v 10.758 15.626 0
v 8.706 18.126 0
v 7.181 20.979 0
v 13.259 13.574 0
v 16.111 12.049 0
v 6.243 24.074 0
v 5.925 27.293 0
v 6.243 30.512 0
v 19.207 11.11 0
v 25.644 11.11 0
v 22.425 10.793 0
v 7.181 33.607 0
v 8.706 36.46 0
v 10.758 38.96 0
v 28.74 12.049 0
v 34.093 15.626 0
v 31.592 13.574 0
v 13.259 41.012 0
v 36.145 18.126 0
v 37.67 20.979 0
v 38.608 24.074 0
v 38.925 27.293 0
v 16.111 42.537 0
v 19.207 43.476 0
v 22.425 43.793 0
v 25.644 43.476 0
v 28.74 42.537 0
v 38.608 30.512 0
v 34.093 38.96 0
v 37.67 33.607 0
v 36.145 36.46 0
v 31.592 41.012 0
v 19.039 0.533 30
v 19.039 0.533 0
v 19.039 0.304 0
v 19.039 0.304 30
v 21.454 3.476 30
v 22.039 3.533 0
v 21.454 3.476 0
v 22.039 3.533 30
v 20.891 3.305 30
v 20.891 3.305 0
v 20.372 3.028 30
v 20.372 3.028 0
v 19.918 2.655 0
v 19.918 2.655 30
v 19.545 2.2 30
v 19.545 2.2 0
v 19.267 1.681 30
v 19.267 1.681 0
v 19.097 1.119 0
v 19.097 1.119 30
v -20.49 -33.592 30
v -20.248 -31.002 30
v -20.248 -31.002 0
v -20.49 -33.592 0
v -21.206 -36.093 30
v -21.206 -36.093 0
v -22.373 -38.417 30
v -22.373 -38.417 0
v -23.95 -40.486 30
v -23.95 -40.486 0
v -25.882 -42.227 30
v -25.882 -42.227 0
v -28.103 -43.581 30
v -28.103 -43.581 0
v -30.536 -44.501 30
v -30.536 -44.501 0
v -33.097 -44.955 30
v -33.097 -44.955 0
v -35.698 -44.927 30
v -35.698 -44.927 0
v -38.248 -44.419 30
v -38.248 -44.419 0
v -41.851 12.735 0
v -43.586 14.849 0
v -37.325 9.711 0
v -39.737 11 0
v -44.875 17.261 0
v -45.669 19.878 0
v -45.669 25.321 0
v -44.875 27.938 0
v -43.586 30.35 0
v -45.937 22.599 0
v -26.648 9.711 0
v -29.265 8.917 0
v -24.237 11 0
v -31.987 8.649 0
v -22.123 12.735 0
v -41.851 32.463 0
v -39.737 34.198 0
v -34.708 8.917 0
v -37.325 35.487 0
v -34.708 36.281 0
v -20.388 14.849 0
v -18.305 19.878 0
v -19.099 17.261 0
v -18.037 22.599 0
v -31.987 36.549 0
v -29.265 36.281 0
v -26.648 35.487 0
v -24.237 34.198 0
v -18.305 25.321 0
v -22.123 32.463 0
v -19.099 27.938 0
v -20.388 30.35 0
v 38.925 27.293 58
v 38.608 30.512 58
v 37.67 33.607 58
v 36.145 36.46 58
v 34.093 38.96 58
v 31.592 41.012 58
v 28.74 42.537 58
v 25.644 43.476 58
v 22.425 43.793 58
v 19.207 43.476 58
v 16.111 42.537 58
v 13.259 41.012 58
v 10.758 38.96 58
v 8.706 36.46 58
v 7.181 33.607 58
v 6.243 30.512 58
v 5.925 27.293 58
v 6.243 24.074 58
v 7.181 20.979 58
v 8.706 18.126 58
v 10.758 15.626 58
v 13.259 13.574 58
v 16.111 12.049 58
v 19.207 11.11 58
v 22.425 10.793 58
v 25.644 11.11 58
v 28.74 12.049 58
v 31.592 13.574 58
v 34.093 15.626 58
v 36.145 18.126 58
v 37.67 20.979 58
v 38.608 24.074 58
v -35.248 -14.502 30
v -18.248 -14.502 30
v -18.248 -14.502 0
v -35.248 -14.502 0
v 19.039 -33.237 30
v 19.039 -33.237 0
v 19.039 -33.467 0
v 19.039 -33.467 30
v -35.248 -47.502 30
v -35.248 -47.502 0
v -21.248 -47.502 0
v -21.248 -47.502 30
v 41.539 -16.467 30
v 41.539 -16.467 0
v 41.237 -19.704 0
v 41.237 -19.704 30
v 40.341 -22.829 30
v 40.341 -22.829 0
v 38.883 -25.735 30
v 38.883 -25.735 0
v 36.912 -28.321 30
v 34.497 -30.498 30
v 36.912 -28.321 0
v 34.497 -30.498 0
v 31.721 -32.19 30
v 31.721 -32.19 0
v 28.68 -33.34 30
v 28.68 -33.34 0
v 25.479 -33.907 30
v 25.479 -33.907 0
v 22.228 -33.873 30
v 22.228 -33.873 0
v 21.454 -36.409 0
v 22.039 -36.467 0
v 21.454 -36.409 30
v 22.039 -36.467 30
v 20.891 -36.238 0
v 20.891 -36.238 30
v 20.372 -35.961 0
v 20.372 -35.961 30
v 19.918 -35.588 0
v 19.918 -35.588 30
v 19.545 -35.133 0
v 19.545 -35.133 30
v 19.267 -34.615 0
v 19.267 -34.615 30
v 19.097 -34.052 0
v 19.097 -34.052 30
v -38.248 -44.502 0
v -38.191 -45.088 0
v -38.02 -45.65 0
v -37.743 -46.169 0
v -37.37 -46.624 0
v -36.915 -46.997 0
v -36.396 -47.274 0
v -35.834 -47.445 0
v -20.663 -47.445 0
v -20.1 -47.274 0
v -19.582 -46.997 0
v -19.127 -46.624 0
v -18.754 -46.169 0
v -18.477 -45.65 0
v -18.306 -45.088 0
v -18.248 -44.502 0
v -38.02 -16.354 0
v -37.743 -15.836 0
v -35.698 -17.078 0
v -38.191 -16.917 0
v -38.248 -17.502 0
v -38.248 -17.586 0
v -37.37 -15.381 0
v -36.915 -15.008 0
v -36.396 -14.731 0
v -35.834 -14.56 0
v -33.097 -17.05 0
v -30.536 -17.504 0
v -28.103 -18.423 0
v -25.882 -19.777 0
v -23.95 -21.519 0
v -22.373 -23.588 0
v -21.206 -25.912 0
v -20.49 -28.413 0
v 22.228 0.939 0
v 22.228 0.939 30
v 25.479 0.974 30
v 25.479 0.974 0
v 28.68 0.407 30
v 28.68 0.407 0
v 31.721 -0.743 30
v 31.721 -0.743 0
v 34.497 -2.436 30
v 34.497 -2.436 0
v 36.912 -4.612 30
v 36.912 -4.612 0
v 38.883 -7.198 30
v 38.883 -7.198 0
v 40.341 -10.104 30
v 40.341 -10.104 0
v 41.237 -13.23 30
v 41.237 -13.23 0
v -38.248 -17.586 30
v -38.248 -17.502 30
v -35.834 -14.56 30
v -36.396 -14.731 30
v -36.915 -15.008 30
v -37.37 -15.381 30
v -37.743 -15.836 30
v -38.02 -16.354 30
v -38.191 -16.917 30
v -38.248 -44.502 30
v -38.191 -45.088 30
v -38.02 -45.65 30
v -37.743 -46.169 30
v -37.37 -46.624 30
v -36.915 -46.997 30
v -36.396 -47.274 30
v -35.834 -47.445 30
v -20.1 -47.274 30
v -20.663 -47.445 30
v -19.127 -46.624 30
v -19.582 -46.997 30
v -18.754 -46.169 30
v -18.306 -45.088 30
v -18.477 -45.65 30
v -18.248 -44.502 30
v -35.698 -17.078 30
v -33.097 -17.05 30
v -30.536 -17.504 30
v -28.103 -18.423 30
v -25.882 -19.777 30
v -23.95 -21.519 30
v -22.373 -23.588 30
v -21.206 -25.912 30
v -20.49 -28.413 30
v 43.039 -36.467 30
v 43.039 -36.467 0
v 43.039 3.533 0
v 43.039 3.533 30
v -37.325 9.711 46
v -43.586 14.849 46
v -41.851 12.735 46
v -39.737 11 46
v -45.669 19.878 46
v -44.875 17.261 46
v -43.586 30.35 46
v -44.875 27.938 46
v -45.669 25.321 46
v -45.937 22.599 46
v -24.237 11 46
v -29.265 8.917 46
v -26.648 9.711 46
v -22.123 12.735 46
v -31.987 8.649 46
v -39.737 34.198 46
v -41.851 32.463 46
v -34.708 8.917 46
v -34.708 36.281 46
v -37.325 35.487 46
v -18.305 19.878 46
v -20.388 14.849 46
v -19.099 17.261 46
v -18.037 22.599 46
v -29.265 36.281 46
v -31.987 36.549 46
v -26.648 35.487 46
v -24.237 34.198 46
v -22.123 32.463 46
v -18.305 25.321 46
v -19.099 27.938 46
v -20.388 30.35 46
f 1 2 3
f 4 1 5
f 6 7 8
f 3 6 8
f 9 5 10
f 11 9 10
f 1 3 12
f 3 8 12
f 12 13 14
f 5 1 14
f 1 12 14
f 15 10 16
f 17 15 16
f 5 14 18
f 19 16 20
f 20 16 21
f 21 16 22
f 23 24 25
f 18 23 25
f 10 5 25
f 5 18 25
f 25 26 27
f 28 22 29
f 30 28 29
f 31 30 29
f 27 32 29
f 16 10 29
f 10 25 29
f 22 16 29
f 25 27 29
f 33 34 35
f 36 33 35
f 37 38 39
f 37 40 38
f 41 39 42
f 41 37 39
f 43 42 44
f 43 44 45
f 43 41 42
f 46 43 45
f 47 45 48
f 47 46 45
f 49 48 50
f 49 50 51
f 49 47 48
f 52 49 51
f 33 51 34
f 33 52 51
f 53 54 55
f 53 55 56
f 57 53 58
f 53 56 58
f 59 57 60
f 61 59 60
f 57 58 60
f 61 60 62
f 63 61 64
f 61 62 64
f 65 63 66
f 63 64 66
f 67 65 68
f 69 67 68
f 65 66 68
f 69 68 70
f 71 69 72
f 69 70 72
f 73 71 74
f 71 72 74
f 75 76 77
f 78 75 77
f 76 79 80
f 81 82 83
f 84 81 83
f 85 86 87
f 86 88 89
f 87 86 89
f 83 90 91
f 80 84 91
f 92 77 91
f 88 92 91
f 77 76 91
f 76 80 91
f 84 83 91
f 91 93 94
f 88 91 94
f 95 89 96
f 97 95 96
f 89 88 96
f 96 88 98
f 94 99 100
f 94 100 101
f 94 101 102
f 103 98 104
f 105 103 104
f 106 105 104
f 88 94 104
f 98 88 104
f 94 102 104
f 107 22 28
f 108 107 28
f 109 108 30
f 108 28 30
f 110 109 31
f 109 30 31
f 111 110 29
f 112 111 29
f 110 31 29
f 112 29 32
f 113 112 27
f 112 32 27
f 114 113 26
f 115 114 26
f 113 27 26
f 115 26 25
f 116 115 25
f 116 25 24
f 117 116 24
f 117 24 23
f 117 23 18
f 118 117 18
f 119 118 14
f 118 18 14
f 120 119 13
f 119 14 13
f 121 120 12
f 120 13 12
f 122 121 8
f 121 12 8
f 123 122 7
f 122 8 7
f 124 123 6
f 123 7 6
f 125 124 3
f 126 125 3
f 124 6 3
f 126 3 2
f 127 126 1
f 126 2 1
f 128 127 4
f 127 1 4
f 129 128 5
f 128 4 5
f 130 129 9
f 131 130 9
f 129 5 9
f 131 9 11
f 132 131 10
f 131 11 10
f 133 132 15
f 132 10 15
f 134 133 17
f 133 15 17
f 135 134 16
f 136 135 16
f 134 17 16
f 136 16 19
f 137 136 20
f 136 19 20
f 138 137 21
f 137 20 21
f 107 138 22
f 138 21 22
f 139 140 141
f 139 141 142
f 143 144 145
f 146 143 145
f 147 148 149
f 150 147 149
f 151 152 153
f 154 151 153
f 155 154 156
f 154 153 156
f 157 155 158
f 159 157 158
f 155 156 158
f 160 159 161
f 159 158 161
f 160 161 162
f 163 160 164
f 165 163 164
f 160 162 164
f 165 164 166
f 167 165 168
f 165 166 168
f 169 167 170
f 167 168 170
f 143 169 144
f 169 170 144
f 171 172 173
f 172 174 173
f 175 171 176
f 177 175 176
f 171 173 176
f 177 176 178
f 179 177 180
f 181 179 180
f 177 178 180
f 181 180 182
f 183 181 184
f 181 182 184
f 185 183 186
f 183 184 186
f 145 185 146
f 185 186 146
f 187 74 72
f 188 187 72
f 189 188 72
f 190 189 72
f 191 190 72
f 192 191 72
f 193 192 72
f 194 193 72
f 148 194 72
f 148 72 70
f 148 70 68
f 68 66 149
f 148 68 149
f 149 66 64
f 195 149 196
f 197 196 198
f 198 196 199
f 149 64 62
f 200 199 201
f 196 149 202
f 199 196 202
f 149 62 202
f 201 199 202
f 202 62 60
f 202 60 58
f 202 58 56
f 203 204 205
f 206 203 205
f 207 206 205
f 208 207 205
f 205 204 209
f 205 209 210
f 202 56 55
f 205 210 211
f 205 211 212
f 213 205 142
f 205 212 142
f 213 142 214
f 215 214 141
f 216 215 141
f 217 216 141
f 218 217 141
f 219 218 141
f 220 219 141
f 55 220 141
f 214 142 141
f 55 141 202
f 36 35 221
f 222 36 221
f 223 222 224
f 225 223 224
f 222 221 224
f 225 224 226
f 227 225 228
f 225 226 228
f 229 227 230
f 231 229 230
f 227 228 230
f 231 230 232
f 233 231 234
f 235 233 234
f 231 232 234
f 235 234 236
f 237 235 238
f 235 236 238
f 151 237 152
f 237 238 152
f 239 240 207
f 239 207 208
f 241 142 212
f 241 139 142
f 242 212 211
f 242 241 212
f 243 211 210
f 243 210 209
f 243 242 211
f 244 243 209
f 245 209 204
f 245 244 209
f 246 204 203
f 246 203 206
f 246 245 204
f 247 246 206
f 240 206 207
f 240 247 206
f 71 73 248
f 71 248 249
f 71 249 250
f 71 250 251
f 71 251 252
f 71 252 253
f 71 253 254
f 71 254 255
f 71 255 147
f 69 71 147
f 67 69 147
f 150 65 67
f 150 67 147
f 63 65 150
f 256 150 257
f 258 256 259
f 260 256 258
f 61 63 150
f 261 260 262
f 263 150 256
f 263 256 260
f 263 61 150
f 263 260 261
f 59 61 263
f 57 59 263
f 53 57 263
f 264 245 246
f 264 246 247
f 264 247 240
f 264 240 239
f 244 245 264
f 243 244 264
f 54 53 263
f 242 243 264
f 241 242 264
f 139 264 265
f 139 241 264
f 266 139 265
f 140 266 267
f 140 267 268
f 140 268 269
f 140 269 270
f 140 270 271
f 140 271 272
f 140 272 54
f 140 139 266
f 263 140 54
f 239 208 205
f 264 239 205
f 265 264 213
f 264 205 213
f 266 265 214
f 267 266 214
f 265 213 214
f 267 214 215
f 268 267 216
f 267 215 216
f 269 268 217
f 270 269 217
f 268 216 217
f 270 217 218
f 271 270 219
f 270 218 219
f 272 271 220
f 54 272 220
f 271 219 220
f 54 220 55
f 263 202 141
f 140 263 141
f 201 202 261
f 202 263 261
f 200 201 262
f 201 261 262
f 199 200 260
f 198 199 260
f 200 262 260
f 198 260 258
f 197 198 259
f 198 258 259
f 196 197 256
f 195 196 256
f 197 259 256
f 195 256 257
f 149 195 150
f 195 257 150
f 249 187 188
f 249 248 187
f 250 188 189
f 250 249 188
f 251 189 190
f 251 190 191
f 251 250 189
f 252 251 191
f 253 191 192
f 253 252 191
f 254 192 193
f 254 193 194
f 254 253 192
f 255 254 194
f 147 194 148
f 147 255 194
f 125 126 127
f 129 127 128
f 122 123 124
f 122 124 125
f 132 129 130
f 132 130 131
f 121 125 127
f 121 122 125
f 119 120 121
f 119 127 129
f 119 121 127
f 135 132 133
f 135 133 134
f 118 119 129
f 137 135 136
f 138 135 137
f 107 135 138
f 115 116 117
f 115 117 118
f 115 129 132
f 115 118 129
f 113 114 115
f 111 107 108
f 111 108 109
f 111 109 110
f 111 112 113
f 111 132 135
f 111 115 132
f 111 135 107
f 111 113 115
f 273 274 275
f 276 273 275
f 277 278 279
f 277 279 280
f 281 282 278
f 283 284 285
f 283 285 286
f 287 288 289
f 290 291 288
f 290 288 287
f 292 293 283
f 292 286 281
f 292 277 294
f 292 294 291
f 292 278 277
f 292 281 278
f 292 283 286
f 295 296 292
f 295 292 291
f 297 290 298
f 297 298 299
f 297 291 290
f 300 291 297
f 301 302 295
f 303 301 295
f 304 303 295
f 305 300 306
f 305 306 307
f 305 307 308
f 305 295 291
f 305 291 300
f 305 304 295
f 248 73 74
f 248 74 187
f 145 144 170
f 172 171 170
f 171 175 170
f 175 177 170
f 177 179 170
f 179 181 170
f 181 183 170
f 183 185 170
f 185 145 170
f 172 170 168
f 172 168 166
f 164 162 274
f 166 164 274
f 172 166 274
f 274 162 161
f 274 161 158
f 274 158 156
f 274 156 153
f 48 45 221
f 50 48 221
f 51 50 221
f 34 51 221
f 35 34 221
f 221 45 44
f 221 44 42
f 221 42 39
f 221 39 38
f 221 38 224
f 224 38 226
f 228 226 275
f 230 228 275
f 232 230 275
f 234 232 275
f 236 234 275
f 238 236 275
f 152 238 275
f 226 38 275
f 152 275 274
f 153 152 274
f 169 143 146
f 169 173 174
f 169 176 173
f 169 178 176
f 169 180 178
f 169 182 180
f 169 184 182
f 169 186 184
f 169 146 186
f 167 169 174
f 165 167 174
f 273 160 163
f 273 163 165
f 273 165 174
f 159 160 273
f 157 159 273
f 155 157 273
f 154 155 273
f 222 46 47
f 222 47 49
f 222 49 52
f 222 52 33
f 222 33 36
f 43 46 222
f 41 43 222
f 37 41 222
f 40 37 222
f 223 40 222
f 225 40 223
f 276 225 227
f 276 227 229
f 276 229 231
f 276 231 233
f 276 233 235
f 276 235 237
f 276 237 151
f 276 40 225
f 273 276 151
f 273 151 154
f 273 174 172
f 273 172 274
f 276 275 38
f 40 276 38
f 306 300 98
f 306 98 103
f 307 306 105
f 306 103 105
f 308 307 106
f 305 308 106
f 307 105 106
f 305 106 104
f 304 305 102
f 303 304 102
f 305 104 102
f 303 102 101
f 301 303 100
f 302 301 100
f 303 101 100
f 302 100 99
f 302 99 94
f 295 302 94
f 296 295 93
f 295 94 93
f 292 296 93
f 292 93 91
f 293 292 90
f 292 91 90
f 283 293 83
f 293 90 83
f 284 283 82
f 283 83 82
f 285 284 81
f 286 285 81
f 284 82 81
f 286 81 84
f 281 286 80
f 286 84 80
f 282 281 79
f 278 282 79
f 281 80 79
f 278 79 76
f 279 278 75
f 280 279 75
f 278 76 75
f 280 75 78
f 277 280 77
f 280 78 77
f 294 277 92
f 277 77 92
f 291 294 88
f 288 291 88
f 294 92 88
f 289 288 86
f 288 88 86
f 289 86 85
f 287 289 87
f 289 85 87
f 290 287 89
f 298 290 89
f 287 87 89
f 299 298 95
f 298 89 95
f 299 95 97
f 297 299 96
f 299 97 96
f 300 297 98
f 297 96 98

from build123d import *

# Parameters (mm, degrees)
F0_R     = 13.95
F1_DEPTH = 46
F0_R_2   = 16.5
F2_DEPTH = 58
F4_DEPTH = 30
F5_R     = 3
F6_R     = 3


with BuildPart() as f1:
    # F0 (on Top) → F1 (new body)
    with BuildSketch(Plane.XY):
        with Locations((-31.986754, 22.599338)):
            Circle(F0_R)
    extrude(amount=F1_DEPTH)


with BuildPart() as f2:
    # F0 (on Top) → F2 (new body)
    with BuildSketch(Plane.XY):
        with Locations((22.425497, 27.293047)):
            Circle(F0_R_2)
    extrude(amount=F2_DEPTH)


with BuildPart() as f4:
    # F3 (on Top) → F4 (new body)
    with BuildSketch(Plane.XY):
        with BuildLine():
            Line((19.039112, -36.466744), (43.039112, -36.466744))
            Line((43.039112, -36.466744), (43.039112, 3.533256))
            Line((43.039112, 3.533256), (19.039112, 3.533256))
            Line((19.039112, 3.533256), (19.039112, 0.303766))
            ThreePointArc((19.039112, 0.303766), (34.497362, -2.435529), (41.539112, -16.466744))
            ThreePointArc((41.539112, -16.466744), (34.497362, -30.497959), (19.039112, -33.237254))
            Line((19.039112, -33.237254), (19.039112, -36.466744))
        make_face()
        with BuildLine():
            Line((-18.248345, -14.502387), (-38.248345, -14.502387))
            Line((-38.248345, -14.502387), (-38.248345, -17.585979))
            ThreePointArc((-38.248345, -17.585979), (-25.881745, -19.777415), (-20.248345, -31.002387))
            ThreePointArc((-20.248345, -31.002387), (-25.881745, -42.227359), (-38.248345, -44.418795))
            Line((-38.248345, -44.418795), (-38.248345, -47.502387))
            Line((-38.248345, -47.502387), (-18.248345, -47.502387))
            Line((-18.248345, -47.502387), (-18.248345, -14.502387))
        make_face()
    extrude(amount=F4_DEPTH)

    # F5
    f5_edges = [f4.edges().sort_by_distance(p)[0] for p in [
        (-38.248345, -47.502387, 15),
        (-38.248345, -14.502387, 15),
        (19.039112, 3.533256, 15),
        (19.039112, -36.466744, 15),
    ]]
    fillet(f5_edges, radius=F5_R)

    # F6
    f6_edges = [f4.edges().sort_by_distance(p)[0] for p in [
        (-18.248345, -47.502387, 15),
    ]]
    fillet(f6_edges, radius=F6_R)


solid = Compound([f1.part, f2.part, f4.part])
